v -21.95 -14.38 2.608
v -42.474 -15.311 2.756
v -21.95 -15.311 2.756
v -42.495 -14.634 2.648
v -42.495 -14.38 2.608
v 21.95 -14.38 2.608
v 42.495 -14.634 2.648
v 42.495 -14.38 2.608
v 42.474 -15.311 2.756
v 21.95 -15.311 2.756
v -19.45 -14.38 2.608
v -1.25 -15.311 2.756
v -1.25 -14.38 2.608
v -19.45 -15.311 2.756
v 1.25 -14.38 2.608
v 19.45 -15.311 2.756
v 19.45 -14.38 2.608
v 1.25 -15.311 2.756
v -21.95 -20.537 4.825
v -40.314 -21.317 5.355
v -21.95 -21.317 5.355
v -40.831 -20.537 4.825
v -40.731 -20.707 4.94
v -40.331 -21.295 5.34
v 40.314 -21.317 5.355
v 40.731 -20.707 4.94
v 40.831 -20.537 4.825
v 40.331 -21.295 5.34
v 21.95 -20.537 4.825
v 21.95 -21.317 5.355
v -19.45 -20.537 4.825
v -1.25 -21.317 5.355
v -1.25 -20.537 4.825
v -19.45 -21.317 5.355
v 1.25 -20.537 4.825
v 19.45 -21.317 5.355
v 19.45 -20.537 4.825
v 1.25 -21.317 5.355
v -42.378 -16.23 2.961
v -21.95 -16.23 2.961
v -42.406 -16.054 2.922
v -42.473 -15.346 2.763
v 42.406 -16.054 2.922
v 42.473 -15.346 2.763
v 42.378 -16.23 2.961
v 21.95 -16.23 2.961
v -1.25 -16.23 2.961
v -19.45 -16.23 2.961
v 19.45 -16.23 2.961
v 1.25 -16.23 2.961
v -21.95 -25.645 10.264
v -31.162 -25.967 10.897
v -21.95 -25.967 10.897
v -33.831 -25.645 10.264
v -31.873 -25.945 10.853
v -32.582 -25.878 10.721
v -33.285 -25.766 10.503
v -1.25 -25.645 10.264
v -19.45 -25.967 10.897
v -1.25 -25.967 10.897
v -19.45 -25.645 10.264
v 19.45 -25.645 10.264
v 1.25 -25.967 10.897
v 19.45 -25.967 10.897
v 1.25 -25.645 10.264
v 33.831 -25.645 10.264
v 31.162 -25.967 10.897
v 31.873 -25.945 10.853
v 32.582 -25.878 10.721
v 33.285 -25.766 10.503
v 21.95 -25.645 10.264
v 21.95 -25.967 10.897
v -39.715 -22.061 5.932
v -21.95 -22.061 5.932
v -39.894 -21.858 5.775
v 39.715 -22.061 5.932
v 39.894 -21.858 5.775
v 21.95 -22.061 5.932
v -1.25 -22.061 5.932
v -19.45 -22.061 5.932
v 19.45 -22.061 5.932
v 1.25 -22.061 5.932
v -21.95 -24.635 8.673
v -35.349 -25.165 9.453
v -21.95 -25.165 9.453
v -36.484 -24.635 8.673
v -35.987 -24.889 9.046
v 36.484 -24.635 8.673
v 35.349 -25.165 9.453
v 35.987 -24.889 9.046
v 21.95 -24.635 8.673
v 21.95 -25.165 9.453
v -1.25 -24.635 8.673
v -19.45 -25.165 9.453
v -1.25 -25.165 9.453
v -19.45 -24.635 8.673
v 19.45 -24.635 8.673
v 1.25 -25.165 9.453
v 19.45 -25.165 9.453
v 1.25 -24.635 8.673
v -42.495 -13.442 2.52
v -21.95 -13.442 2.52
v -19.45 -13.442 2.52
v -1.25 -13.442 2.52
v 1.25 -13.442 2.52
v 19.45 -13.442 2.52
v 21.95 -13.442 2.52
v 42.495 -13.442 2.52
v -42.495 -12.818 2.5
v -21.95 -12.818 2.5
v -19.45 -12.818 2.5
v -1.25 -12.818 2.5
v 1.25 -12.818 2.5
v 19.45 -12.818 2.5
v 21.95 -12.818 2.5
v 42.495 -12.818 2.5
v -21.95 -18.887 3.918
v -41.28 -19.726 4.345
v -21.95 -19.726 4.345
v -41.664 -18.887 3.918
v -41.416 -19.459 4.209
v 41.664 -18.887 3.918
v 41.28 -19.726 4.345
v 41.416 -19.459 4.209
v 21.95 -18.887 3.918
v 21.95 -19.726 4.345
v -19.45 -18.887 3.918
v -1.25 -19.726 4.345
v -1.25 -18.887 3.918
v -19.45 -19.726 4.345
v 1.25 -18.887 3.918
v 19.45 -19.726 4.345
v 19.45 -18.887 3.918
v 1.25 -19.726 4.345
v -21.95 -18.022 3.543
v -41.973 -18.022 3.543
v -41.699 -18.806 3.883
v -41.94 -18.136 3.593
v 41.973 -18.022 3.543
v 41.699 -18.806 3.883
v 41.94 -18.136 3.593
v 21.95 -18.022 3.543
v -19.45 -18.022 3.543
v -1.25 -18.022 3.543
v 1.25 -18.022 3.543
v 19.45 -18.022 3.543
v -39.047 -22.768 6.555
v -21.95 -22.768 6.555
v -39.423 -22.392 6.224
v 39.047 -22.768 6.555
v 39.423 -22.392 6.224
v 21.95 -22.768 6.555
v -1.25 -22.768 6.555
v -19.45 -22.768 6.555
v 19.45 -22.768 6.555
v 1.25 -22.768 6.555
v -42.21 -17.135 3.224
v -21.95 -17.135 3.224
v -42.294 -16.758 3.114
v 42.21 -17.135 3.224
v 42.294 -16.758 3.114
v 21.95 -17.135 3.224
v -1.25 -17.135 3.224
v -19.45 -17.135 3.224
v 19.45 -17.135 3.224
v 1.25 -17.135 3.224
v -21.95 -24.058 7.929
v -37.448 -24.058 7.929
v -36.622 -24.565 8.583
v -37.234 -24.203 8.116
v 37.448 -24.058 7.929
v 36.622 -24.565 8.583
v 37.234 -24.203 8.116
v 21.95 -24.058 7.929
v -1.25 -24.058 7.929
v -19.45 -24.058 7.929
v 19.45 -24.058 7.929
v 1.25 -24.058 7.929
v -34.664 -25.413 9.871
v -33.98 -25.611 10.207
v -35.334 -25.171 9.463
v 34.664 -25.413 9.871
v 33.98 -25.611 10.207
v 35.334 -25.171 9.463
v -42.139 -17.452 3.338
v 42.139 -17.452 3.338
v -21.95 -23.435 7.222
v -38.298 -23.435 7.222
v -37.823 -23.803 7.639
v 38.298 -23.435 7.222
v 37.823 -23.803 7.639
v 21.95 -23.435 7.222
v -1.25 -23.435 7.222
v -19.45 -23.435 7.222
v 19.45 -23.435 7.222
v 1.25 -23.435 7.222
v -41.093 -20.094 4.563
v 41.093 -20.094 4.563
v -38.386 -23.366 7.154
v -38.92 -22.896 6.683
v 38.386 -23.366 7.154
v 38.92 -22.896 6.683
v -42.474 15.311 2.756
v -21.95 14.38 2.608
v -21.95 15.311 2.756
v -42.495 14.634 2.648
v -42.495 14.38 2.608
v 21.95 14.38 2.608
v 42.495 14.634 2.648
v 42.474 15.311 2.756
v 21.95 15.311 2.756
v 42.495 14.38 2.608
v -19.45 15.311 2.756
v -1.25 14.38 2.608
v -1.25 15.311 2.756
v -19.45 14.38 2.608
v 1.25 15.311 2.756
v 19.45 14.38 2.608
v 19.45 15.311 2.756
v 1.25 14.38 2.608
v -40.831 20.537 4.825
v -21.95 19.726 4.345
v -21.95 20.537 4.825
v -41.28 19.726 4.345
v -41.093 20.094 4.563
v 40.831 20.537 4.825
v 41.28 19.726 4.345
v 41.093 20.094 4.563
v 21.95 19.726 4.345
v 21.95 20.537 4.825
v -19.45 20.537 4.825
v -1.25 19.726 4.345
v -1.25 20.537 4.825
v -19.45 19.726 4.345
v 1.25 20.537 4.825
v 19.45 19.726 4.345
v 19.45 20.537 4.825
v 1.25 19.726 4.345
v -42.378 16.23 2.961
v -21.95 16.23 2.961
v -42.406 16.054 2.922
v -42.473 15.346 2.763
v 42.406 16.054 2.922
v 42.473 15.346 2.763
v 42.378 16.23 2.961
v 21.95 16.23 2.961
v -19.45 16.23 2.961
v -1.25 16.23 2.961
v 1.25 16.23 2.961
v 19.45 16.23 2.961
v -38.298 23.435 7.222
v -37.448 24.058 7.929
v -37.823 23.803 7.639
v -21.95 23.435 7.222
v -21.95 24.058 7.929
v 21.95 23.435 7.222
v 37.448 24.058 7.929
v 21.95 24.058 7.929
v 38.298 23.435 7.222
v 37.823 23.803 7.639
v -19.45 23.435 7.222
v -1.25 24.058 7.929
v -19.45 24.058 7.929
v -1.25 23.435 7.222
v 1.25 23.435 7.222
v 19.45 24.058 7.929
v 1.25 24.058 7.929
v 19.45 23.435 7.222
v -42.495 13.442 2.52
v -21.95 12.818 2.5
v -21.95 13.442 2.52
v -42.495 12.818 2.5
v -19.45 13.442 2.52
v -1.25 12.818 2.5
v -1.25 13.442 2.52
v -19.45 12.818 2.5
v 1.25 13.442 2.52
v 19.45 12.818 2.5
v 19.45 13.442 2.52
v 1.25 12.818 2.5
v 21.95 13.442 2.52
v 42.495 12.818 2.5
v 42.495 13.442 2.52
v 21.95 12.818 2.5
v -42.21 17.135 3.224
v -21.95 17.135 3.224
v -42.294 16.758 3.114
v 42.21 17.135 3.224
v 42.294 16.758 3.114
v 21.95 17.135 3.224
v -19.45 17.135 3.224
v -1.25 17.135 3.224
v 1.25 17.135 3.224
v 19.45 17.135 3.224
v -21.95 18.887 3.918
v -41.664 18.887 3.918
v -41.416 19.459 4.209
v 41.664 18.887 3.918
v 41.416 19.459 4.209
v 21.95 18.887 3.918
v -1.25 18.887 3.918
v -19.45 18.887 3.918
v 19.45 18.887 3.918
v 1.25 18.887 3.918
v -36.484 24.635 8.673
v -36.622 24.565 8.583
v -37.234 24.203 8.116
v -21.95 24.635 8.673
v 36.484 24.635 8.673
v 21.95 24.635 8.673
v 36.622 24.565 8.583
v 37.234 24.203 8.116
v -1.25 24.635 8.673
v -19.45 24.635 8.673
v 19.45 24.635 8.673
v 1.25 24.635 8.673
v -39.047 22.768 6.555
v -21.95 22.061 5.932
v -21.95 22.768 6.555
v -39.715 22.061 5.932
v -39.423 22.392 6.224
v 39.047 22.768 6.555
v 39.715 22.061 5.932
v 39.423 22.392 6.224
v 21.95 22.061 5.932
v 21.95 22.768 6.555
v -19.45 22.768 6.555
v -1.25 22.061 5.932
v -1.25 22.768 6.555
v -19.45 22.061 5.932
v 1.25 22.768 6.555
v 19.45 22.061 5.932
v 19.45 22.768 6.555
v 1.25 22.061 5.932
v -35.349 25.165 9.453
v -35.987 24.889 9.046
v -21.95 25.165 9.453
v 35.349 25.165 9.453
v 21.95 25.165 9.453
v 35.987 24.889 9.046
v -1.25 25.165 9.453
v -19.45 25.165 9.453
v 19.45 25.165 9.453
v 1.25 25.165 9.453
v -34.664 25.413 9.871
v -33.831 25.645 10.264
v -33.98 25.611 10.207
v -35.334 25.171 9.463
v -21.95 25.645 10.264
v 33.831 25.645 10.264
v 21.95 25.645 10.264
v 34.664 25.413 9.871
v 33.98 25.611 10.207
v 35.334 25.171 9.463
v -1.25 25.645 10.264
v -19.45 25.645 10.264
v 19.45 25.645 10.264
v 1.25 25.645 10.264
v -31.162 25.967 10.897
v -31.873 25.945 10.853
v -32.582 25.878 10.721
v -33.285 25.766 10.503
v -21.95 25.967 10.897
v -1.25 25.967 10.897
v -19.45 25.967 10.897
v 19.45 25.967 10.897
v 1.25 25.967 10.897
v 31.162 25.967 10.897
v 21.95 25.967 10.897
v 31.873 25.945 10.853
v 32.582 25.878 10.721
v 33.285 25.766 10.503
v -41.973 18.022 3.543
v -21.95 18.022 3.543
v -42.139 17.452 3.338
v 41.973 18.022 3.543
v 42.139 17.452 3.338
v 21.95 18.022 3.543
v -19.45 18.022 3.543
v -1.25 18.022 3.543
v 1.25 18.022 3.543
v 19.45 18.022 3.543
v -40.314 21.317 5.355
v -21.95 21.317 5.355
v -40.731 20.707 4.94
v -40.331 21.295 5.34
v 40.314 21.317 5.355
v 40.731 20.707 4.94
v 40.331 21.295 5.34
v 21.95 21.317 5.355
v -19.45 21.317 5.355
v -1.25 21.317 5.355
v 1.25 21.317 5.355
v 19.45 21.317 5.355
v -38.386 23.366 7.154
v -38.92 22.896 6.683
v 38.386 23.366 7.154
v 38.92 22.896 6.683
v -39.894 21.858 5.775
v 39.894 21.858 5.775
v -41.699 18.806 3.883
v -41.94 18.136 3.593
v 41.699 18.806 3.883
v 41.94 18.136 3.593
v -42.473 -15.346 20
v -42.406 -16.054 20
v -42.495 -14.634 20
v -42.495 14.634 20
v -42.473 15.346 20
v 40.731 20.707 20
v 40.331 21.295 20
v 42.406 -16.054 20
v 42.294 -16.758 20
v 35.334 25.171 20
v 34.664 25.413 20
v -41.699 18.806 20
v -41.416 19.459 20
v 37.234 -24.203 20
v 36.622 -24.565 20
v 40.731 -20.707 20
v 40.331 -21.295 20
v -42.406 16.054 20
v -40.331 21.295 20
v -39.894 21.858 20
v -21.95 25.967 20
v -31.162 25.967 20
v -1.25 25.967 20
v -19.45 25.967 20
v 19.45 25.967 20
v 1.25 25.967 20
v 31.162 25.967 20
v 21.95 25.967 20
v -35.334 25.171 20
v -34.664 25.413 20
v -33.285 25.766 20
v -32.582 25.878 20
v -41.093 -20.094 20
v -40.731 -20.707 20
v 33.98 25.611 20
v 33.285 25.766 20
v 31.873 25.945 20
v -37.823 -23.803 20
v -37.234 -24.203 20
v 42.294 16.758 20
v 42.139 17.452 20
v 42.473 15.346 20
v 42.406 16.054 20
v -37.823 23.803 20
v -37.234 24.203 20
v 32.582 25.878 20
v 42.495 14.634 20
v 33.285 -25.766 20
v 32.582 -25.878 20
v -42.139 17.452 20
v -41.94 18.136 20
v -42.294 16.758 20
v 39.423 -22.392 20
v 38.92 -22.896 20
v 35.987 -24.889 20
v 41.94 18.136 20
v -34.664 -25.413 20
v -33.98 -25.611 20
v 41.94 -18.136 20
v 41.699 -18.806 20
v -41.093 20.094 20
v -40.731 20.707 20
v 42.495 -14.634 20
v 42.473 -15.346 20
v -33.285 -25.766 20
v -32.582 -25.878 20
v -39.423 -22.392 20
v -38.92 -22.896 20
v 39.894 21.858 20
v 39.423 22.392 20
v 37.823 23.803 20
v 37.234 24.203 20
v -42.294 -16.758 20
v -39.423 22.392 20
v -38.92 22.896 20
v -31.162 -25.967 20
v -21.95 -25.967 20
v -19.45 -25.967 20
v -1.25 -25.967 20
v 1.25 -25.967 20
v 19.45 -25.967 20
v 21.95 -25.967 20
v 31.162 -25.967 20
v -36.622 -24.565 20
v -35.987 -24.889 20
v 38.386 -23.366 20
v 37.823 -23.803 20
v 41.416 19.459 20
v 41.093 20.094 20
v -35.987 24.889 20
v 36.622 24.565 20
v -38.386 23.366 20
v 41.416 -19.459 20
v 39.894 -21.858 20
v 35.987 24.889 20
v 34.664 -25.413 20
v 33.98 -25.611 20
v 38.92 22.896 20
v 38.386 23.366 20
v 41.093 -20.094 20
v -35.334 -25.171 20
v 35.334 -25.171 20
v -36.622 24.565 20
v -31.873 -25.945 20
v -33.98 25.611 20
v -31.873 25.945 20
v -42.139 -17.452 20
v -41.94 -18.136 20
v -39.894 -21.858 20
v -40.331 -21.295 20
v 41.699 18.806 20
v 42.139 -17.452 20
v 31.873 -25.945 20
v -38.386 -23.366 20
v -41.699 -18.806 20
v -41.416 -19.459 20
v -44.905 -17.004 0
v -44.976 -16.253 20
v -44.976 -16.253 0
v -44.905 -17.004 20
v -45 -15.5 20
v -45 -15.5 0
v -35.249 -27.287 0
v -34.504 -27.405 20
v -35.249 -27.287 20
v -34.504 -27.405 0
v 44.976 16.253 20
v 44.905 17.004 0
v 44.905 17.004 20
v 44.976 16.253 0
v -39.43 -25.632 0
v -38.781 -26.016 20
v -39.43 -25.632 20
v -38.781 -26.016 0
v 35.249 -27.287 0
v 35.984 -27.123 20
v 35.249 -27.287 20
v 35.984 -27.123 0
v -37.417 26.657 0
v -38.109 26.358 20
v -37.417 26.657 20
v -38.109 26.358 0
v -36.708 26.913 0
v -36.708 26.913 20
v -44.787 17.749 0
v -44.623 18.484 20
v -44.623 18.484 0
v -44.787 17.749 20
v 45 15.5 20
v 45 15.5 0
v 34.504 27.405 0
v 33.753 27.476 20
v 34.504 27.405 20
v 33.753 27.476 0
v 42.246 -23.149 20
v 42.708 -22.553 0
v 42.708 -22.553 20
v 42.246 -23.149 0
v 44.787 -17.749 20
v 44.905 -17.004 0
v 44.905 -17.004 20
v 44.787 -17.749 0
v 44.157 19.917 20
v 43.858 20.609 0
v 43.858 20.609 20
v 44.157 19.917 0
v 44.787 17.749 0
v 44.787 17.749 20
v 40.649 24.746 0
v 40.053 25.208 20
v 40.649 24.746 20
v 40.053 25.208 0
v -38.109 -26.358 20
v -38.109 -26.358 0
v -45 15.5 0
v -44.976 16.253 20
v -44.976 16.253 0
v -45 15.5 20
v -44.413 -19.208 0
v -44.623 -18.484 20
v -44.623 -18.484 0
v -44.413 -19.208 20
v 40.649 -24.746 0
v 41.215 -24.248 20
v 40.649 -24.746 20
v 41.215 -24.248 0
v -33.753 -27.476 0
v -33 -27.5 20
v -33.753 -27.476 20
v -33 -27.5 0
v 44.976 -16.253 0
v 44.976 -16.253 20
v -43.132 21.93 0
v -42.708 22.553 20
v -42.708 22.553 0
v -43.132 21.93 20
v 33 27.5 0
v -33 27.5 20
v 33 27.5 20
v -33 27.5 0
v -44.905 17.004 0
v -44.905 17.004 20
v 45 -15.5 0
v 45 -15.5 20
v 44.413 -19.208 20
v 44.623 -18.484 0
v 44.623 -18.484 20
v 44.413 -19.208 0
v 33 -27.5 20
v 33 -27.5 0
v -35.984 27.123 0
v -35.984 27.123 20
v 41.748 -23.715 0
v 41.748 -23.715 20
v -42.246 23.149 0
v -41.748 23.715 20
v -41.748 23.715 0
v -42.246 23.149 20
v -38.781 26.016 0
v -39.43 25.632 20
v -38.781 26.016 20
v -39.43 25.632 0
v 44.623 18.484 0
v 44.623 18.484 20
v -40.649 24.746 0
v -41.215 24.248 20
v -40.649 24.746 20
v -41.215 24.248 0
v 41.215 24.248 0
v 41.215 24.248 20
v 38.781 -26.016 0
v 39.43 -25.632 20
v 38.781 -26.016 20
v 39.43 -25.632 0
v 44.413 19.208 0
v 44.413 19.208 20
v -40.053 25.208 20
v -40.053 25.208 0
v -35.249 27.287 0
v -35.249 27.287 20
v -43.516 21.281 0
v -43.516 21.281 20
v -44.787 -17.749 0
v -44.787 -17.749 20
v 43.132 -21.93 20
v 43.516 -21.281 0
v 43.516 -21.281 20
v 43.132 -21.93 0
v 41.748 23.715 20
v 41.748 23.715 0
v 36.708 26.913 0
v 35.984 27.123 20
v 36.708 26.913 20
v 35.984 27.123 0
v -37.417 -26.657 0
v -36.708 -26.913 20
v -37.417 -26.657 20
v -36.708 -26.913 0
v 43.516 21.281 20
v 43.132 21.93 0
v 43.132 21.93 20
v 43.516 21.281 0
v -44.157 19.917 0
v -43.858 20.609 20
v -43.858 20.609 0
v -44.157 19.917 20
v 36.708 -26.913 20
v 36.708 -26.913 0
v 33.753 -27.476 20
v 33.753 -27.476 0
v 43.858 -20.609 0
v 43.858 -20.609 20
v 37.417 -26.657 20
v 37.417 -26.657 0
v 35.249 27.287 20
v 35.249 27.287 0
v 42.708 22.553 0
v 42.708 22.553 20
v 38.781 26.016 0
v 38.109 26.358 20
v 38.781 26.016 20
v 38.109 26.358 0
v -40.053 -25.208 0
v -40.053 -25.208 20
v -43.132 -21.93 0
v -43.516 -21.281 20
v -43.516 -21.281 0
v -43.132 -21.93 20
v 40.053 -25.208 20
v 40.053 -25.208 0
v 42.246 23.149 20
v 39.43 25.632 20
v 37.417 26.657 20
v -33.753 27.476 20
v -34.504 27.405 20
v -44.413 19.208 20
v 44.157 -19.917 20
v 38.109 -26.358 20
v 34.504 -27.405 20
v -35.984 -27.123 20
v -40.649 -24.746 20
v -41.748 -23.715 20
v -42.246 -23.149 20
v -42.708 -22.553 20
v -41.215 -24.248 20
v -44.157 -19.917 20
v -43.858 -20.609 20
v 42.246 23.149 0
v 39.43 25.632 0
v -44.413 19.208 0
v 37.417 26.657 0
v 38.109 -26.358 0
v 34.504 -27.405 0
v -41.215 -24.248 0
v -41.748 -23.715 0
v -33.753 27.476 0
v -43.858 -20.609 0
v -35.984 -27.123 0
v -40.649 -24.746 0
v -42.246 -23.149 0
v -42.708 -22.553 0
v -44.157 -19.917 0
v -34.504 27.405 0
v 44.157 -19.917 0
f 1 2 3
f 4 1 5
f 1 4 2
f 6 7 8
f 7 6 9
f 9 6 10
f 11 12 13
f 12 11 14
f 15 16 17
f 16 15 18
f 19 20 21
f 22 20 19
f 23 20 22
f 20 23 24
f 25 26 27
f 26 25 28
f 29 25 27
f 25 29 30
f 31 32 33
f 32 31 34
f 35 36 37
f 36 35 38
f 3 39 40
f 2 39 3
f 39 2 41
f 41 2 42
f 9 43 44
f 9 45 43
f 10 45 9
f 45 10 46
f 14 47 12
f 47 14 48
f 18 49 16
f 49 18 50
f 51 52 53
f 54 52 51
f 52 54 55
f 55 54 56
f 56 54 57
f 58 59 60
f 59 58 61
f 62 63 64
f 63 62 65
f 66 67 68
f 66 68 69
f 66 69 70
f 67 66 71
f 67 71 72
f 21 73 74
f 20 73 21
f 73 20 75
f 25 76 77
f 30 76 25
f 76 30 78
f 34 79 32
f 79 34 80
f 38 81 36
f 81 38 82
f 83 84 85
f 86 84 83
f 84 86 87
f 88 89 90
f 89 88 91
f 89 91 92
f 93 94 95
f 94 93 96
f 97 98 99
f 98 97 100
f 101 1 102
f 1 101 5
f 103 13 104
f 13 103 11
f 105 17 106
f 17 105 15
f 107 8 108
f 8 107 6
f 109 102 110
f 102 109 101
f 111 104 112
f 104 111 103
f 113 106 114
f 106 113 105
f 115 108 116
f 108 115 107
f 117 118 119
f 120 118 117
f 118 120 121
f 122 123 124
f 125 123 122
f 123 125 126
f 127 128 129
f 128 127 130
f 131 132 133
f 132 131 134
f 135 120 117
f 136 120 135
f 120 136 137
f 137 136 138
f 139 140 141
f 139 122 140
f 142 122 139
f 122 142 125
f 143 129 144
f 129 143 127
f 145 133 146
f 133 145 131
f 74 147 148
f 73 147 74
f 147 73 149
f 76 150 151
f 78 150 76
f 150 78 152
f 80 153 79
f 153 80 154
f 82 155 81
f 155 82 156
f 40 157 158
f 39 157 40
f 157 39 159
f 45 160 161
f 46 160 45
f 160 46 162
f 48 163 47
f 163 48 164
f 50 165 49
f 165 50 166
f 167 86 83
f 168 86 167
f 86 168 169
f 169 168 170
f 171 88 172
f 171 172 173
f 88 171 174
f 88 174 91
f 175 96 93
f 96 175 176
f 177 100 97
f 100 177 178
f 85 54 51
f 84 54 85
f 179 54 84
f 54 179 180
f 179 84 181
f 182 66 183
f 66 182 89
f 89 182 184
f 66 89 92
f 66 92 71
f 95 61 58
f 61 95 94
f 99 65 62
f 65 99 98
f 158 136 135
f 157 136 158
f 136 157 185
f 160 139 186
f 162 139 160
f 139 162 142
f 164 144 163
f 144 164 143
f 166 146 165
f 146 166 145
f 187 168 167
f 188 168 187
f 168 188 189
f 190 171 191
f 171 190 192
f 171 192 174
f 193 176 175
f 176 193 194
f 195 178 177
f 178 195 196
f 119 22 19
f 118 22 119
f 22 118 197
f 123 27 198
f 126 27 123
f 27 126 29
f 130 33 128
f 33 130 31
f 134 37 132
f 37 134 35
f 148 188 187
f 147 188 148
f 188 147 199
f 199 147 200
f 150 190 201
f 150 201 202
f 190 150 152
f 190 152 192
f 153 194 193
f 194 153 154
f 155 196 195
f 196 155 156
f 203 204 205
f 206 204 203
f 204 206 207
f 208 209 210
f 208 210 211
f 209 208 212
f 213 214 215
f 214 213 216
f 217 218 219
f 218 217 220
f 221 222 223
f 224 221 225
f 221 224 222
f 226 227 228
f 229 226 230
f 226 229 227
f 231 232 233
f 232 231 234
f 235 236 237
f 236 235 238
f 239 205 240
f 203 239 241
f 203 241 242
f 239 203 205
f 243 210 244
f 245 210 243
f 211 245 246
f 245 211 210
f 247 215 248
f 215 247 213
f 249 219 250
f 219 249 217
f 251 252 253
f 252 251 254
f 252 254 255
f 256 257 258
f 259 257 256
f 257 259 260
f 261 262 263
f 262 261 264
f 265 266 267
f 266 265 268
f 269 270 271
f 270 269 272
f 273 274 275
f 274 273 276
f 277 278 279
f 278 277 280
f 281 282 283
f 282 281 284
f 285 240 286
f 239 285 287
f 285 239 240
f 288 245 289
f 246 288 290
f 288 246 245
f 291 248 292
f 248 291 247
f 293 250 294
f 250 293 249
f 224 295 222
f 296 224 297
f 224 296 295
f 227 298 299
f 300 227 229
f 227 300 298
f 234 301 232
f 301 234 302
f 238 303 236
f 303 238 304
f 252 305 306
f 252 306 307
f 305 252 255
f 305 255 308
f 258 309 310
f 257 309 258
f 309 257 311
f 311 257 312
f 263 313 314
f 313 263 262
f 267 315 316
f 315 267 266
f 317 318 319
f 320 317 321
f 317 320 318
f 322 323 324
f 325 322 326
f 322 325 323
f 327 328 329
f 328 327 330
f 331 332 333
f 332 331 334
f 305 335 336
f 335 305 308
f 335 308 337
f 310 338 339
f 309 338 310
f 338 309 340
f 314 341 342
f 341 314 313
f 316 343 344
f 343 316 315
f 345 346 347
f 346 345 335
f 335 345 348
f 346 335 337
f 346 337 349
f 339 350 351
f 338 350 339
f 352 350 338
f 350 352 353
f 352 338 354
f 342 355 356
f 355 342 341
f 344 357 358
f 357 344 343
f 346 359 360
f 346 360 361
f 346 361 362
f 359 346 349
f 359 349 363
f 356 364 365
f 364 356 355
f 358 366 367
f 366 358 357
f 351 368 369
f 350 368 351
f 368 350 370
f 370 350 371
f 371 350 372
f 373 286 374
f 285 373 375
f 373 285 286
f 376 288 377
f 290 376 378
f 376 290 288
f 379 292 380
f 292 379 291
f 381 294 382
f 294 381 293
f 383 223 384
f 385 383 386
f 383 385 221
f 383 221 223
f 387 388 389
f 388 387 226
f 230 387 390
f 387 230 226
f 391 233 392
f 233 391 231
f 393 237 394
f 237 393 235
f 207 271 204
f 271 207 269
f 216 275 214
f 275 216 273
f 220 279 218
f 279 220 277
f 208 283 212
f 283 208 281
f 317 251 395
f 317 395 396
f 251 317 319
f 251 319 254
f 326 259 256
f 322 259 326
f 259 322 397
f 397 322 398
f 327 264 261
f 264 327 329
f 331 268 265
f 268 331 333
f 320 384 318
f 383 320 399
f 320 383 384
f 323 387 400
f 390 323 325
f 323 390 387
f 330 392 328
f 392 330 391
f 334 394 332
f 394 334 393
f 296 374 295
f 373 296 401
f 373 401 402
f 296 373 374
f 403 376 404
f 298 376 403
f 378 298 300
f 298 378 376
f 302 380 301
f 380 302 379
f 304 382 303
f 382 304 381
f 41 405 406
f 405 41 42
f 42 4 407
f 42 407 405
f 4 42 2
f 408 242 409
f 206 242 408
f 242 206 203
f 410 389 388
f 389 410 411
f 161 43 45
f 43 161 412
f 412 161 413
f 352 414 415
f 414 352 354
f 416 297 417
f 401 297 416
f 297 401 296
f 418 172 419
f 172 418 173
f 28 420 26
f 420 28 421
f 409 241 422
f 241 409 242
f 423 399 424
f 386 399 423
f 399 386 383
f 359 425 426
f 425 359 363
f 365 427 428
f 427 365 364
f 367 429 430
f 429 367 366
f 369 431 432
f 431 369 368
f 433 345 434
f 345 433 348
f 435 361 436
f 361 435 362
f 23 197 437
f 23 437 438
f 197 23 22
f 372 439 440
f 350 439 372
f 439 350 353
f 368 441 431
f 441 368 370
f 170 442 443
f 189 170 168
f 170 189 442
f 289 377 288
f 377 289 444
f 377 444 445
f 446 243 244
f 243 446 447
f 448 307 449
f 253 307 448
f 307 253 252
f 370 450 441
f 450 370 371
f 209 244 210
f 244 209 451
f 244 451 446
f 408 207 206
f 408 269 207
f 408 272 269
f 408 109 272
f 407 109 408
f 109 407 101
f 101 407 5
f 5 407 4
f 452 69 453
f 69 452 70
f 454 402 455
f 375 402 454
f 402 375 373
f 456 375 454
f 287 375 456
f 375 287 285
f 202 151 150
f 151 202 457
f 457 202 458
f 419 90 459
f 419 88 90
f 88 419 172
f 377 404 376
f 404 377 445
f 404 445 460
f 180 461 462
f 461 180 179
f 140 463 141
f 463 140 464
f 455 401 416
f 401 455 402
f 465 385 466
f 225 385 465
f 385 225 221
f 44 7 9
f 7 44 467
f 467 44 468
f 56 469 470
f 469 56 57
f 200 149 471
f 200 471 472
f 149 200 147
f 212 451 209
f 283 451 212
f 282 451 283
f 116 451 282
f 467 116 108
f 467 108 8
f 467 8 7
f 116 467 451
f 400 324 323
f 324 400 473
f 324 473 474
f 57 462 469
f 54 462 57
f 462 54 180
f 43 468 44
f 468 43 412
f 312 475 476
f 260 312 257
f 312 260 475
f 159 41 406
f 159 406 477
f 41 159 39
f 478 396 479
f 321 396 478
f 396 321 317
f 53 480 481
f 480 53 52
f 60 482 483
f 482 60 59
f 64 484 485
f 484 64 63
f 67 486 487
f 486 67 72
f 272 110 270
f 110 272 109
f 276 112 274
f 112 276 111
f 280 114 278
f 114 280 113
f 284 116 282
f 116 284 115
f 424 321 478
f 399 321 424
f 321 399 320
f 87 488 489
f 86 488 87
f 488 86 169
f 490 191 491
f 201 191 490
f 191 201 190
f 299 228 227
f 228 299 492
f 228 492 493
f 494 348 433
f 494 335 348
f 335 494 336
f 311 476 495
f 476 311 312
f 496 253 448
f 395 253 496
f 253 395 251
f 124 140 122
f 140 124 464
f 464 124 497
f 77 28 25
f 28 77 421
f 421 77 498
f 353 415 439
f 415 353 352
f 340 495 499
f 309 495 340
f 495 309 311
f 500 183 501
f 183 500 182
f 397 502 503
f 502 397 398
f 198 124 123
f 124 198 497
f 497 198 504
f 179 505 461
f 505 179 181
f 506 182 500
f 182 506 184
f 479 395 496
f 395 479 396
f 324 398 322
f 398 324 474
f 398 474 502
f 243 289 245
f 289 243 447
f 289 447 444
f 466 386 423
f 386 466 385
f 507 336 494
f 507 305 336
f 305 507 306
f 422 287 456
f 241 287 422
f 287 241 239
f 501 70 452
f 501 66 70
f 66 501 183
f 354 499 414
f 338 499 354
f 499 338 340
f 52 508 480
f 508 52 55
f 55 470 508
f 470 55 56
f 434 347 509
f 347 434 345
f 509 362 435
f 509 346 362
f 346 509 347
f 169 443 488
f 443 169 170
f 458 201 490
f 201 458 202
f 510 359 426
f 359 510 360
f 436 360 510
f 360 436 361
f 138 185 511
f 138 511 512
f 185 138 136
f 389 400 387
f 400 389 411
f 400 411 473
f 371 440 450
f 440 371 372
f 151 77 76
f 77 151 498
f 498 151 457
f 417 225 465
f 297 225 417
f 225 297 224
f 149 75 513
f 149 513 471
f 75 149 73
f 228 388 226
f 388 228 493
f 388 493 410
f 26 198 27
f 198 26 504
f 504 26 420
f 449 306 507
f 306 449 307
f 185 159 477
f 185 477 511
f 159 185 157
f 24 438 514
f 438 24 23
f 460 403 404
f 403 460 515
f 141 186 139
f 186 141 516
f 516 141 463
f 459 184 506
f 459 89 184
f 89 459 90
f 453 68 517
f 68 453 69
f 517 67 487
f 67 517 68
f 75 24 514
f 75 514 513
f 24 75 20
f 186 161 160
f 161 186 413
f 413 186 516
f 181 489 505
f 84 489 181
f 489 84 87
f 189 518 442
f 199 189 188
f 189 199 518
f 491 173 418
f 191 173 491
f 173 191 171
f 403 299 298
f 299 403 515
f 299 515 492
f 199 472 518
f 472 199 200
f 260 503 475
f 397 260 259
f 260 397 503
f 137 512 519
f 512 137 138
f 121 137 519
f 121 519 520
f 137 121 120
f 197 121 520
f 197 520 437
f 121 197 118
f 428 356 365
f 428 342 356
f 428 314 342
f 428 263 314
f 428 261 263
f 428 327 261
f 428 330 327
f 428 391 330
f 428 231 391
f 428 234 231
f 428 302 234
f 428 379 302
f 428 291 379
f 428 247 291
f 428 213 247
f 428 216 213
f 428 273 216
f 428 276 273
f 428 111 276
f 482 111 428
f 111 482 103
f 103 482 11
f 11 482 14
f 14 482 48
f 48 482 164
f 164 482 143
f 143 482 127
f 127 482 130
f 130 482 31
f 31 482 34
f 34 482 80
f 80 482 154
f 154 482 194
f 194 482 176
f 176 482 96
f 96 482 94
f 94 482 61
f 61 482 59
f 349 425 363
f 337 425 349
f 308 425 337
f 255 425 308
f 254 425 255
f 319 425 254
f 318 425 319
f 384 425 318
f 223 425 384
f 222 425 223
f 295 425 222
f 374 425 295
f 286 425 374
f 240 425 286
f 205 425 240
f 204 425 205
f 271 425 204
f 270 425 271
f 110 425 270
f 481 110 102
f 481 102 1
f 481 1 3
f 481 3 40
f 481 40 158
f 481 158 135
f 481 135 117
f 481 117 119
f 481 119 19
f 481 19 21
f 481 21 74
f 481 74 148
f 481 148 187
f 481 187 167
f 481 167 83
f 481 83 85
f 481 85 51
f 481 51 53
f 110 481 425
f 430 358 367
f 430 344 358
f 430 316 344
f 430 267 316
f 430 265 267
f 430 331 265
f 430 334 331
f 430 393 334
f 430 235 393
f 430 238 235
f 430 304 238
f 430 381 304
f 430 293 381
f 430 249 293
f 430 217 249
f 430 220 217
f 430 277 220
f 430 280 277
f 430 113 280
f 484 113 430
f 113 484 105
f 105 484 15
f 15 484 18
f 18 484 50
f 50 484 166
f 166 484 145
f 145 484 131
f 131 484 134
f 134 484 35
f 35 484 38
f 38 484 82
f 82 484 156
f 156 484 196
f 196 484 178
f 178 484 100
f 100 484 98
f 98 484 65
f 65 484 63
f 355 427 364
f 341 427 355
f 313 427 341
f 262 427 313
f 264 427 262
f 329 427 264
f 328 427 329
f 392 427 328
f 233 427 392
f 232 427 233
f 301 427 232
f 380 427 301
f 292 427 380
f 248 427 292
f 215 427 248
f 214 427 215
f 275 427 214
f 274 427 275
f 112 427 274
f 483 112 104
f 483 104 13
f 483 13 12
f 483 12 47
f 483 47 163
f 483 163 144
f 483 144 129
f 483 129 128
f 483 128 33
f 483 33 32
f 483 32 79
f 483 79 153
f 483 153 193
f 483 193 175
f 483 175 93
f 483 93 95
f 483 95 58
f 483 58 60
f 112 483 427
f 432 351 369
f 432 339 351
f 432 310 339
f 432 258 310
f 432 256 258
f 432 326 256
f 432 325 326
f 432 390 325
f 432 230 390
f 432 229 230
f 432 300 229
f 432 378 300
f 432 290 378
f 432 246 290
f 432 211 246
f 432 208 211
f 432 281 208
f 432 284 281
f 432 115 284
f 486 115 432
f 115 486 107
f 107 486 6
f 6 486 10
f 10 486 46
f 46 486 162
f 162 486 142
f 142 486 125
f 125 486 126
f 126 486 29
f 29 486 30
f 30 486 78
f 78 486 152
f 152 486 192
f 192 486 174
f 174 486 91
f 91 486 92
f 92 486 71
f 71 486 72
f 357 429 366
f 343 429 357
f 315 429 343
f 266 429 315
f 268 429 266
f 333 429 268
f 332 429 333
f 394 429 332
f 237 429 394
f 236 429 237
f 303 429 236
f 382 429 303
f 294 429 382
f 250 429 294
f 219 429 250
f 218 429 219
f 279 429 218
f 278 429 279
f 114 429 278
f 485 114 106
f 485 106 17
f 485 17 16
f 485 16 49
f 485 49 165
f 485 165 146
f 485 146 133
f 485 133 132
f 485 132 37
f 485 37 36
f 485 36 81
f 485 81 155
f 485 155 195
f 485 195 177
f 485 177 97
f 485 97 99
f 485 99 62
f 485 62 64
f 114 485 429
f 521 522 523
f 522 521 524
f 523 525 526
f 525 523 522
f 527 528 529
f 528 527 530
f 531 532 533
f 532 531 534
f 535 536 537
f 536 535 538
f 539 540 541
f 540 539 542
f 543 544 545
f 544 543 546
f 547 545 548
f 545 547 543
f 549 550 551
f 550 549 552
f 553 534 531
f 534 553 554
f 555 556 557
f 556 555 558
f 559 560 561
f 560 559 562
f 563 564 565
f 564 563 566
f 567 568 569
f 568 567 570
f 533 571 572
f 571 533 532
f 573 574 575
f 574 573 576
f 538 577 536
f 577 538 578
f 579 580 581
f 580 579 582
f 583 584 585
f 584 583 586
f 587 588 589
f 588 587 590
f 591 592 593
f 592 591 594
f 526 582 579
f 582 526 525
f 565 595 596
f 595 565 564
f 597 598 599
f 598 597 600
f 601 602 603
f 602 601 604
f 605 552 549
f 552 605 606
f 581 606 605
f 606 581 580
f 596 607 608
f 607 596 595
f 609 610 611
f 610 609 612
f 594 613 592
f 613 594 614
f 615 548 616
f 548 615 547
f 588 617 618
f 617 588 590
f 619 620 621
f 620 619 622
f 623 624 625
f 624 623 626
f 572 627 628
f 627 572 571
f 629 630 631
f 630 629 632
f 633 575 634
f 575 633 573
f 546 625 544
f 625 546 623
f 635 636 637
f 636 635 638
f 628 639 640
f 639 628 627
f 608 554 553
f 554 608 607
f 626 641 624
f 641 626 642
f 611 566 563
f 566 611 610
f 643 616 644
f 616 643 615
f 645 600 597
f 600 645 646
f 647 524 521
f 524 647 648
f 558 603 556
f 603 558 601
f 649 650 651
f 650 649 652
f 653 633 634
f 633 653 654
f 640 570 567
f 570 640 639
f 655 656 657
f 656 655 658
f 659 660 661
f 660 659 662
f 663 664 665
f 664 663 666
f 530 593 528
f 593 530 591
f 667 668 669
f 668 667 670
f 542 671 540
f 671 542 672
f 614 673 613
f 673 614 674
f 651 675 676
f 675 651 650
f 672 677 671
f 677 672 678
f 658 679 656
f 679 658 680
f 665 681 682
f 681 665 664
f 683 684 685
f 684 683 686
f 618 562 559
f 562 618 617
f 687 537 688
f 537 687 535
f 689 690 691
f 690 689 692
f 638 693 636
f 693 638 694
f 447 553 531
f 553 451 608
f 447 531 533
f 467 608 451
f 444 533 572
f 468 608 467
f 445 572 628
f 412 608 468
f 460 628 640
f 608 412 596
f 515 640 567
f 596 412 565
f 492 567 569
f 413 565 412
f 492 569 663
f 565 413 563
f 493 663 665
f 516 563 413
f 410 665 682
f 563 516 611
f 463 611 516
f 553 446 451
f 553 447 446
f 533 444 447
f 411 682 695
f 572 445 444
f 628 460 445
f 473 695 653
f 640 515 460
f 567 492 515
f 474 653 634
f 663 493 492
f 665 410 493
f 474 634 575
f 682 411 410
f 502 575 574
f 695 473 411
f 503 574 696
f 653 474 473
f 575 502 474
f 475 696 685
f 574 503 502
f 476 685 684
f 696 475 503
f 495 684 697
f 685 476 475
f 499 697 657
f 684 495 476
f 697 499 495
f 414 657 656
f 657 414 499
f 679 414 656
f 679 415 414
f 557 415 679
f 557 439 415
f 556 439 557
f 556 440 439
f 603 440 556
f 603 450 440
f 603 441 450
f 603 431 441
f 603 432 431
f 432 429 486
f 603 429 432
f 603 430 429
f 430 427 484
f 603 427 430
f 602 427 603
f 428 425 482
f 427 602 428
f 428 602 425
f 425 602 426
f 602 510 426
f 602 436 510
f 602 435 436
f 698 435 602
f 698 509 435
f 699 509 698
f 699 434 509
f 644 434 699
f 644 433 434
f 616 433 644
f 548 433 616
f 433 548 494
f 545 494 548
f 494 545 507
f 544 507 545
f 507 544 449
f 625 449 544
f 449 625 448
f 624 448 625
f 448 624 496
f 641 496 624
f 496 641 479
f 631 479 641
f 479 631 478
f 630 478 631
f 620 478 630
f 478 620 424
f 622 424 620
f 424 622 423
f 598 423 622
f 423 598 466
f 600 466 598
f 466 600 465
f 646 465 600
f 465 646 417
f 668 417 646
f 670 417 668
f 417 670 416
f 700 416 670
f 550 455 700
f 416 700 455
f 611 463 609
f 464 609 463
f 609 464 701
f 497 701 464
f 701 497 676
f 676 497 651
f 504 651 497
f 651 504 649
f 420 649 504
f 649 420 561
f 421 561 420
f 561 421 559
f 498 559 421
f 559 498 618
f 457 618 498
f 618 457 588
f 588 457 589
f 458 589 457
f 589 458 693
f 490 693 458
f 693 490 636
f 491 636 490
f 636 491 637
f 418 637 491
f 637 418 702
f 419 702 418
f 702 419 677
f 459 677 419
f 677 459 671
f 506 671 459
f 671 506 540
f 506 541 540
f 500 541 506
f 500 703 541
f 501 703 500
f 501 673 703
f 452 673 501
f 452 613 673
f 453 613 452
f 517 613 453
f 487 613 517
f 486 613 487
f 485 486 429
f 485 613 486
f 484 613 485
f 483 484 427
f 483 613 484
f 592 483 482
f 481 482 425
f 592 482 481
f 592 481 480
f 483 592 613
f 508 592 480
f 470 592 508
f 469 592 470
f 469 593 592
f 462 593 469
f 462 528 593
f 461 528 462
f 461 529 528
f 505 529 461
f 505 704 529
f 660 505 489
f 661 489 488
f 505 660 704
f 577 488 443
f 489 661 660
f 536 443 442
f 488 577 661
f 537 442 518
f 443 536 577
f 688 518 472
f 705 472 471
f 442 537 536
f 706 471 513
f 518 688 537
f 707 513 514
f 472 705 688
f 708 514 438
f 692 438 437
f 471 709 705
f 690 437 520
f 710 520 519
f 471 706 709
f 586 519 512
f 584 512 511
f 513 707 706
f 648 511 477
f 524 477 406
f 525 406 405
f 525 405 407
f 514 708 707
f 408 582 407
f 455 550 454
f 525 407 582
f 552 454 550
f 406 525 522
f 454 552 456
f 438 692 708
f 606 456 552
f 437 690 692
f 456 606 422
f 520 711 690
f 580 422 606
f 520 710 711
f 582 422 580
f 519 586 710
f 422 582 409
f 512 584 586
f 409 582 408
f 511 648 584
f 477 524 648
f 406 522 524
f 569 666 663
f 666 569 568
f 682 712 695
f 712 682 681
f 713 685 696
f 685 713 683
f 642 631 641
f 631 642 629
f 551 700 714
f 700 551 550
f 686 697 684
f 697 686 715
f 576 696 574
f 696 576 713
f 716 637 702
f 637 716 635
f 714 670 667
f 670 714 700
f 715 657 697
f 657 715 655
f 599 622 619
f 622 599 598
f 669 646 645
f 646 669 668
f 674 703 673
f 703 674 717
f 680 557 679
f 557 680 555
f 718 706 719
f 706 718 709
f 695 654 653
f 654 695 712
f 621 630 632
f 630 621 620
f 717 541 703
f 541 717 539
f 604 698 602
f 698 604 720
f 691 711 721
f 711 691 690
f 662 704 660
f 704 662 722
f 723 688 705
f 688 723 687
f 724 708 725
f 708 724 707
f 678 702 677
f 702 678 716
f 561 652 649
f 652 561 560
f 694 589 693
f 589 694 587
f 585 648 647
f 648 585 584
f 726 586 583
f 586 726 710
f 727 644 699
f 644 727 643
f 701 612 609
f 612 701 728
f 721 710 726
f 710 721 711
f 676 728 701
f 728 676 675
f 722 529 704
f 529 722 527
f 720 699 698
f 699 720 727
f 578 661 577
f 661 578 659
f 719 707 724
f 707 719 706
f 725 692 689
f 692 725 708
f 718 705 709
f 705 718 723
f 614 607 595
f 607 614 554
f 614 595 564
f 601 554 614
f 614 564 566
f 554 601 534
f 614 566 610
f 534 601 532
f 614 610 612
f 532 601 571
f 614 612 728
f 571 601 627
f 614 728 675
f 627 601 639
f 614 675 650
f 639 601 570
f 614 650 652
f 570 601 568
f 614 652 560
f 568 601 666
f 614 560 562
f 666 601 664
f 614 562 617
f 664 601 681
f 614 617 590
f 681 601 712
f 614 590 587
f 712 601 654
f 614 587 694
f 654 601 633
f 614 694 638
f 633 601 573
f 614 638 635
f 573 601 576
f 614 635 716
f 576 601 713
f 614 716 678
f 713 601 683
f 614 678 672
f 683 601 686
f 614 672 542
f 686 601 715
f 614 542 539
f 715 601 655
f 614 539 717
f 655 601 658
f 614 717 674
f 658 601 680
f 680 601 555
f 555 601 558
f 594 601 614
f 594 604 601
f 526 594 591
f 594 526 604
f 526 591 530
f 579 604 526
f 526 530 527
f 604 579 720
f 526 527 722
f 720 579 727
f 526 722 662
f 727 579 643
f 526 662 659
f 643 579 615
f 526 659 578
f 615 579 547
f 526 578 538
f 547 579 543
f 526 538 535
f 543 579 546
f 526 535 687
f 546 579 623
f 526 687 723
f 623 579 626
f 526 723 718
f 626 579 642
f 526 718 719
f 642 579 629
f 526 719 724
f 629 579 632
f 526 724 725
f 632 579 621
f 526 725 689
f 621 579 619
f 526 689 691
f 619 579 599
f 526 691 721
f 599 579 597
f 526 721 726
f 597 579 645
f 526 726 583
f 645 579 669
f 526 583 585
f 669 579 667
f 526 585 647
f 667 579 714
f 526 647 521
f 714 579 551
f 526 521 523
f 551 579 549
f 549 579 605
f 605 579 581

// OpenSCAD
// Altoids tin insert

$fn = 100;

length = 90;
width = 55;
height = 20;
corner_radius = 12;
scoop_radius = 15;
thickness = 2.5;
wall_scale = (length - 2 * thickness) / length;

module roundedRect(x, y, z, radius)
{
	// http://www.thingiverse.com/thing:9347
	linear_extrude(height = z) hull()
	{
		// place 4 circles in the corners, with the given radius
		translate([ (-x / 2) + (radius), (-y / 2) + (radius), 0 ])
		circle(r = radius);

		translate([ (x / 2) - (radius), (-y / 2) + (radius), 0 ])
		circle(r = radius);

		translate([ (-x / 2) + (radius), (y / 2) - (radius), 0 ])
		circle(r = radius);

		translate([ (x / 2) - (radius), (y / 2) - (radius), 0 ])
		circle(r = radius);
	}
}

difference()
{
	// Main tin
	roundedRect(length, width, height, corner_radius);

	difference()
	{
		translate([ 0, 0, thickness ])
		roundedRect(wall_scale * length - 0.01, wall_scale * width - 0.01, height - 0.01, wall_scale * corner_radius);

		// allow slightly bigger outside pockets to account for rounded corners of tin
		factor = 0.23;
		translate([ -length * factor - thickness / 2, -width / 2, thickness ])
		cube([ thickness, width, height ]);

		translate([ -thickness / 2, -width / 2, thickness ])
		cube([ thickness, width, height ]);

		translate([ length * factor - thickness / 2, -width / 2, thickness ])
		cube([ thickness, width, height ]);

		translate([ -length / 2, -width / 2, thickness - 0.01 ])
		intersection()
		{
			cube([ length, scoop_radius, scoop_radius ]);

			difference()
			{
				cube([ length - 0.01, scoop_radius * 2, scoop_radius * 2 ]);
				translate([ 0, scoop_radius, scoop_radius ])
				rotate([ 0, 90, 0 ])
				cylinder(h = length, r = scoop_radius);
			}
		}

		translate([ -length / 2, width / 2 - scoop_radius, thickness - 0.01 ])
		intersection()
		{
			cube([ length, scoop_radius, scoop_radius ]);

			difference()
			{
				cube([ length - 0.01, scoop_radius * 2, scoop_radius * 2 ]);
				translate([ 0, 0, scoop_radius ])
				rotate([ 0, 90, 0 ])
				cylinder(h = length, r = scoop_radius);
			}
		}
	}
}
